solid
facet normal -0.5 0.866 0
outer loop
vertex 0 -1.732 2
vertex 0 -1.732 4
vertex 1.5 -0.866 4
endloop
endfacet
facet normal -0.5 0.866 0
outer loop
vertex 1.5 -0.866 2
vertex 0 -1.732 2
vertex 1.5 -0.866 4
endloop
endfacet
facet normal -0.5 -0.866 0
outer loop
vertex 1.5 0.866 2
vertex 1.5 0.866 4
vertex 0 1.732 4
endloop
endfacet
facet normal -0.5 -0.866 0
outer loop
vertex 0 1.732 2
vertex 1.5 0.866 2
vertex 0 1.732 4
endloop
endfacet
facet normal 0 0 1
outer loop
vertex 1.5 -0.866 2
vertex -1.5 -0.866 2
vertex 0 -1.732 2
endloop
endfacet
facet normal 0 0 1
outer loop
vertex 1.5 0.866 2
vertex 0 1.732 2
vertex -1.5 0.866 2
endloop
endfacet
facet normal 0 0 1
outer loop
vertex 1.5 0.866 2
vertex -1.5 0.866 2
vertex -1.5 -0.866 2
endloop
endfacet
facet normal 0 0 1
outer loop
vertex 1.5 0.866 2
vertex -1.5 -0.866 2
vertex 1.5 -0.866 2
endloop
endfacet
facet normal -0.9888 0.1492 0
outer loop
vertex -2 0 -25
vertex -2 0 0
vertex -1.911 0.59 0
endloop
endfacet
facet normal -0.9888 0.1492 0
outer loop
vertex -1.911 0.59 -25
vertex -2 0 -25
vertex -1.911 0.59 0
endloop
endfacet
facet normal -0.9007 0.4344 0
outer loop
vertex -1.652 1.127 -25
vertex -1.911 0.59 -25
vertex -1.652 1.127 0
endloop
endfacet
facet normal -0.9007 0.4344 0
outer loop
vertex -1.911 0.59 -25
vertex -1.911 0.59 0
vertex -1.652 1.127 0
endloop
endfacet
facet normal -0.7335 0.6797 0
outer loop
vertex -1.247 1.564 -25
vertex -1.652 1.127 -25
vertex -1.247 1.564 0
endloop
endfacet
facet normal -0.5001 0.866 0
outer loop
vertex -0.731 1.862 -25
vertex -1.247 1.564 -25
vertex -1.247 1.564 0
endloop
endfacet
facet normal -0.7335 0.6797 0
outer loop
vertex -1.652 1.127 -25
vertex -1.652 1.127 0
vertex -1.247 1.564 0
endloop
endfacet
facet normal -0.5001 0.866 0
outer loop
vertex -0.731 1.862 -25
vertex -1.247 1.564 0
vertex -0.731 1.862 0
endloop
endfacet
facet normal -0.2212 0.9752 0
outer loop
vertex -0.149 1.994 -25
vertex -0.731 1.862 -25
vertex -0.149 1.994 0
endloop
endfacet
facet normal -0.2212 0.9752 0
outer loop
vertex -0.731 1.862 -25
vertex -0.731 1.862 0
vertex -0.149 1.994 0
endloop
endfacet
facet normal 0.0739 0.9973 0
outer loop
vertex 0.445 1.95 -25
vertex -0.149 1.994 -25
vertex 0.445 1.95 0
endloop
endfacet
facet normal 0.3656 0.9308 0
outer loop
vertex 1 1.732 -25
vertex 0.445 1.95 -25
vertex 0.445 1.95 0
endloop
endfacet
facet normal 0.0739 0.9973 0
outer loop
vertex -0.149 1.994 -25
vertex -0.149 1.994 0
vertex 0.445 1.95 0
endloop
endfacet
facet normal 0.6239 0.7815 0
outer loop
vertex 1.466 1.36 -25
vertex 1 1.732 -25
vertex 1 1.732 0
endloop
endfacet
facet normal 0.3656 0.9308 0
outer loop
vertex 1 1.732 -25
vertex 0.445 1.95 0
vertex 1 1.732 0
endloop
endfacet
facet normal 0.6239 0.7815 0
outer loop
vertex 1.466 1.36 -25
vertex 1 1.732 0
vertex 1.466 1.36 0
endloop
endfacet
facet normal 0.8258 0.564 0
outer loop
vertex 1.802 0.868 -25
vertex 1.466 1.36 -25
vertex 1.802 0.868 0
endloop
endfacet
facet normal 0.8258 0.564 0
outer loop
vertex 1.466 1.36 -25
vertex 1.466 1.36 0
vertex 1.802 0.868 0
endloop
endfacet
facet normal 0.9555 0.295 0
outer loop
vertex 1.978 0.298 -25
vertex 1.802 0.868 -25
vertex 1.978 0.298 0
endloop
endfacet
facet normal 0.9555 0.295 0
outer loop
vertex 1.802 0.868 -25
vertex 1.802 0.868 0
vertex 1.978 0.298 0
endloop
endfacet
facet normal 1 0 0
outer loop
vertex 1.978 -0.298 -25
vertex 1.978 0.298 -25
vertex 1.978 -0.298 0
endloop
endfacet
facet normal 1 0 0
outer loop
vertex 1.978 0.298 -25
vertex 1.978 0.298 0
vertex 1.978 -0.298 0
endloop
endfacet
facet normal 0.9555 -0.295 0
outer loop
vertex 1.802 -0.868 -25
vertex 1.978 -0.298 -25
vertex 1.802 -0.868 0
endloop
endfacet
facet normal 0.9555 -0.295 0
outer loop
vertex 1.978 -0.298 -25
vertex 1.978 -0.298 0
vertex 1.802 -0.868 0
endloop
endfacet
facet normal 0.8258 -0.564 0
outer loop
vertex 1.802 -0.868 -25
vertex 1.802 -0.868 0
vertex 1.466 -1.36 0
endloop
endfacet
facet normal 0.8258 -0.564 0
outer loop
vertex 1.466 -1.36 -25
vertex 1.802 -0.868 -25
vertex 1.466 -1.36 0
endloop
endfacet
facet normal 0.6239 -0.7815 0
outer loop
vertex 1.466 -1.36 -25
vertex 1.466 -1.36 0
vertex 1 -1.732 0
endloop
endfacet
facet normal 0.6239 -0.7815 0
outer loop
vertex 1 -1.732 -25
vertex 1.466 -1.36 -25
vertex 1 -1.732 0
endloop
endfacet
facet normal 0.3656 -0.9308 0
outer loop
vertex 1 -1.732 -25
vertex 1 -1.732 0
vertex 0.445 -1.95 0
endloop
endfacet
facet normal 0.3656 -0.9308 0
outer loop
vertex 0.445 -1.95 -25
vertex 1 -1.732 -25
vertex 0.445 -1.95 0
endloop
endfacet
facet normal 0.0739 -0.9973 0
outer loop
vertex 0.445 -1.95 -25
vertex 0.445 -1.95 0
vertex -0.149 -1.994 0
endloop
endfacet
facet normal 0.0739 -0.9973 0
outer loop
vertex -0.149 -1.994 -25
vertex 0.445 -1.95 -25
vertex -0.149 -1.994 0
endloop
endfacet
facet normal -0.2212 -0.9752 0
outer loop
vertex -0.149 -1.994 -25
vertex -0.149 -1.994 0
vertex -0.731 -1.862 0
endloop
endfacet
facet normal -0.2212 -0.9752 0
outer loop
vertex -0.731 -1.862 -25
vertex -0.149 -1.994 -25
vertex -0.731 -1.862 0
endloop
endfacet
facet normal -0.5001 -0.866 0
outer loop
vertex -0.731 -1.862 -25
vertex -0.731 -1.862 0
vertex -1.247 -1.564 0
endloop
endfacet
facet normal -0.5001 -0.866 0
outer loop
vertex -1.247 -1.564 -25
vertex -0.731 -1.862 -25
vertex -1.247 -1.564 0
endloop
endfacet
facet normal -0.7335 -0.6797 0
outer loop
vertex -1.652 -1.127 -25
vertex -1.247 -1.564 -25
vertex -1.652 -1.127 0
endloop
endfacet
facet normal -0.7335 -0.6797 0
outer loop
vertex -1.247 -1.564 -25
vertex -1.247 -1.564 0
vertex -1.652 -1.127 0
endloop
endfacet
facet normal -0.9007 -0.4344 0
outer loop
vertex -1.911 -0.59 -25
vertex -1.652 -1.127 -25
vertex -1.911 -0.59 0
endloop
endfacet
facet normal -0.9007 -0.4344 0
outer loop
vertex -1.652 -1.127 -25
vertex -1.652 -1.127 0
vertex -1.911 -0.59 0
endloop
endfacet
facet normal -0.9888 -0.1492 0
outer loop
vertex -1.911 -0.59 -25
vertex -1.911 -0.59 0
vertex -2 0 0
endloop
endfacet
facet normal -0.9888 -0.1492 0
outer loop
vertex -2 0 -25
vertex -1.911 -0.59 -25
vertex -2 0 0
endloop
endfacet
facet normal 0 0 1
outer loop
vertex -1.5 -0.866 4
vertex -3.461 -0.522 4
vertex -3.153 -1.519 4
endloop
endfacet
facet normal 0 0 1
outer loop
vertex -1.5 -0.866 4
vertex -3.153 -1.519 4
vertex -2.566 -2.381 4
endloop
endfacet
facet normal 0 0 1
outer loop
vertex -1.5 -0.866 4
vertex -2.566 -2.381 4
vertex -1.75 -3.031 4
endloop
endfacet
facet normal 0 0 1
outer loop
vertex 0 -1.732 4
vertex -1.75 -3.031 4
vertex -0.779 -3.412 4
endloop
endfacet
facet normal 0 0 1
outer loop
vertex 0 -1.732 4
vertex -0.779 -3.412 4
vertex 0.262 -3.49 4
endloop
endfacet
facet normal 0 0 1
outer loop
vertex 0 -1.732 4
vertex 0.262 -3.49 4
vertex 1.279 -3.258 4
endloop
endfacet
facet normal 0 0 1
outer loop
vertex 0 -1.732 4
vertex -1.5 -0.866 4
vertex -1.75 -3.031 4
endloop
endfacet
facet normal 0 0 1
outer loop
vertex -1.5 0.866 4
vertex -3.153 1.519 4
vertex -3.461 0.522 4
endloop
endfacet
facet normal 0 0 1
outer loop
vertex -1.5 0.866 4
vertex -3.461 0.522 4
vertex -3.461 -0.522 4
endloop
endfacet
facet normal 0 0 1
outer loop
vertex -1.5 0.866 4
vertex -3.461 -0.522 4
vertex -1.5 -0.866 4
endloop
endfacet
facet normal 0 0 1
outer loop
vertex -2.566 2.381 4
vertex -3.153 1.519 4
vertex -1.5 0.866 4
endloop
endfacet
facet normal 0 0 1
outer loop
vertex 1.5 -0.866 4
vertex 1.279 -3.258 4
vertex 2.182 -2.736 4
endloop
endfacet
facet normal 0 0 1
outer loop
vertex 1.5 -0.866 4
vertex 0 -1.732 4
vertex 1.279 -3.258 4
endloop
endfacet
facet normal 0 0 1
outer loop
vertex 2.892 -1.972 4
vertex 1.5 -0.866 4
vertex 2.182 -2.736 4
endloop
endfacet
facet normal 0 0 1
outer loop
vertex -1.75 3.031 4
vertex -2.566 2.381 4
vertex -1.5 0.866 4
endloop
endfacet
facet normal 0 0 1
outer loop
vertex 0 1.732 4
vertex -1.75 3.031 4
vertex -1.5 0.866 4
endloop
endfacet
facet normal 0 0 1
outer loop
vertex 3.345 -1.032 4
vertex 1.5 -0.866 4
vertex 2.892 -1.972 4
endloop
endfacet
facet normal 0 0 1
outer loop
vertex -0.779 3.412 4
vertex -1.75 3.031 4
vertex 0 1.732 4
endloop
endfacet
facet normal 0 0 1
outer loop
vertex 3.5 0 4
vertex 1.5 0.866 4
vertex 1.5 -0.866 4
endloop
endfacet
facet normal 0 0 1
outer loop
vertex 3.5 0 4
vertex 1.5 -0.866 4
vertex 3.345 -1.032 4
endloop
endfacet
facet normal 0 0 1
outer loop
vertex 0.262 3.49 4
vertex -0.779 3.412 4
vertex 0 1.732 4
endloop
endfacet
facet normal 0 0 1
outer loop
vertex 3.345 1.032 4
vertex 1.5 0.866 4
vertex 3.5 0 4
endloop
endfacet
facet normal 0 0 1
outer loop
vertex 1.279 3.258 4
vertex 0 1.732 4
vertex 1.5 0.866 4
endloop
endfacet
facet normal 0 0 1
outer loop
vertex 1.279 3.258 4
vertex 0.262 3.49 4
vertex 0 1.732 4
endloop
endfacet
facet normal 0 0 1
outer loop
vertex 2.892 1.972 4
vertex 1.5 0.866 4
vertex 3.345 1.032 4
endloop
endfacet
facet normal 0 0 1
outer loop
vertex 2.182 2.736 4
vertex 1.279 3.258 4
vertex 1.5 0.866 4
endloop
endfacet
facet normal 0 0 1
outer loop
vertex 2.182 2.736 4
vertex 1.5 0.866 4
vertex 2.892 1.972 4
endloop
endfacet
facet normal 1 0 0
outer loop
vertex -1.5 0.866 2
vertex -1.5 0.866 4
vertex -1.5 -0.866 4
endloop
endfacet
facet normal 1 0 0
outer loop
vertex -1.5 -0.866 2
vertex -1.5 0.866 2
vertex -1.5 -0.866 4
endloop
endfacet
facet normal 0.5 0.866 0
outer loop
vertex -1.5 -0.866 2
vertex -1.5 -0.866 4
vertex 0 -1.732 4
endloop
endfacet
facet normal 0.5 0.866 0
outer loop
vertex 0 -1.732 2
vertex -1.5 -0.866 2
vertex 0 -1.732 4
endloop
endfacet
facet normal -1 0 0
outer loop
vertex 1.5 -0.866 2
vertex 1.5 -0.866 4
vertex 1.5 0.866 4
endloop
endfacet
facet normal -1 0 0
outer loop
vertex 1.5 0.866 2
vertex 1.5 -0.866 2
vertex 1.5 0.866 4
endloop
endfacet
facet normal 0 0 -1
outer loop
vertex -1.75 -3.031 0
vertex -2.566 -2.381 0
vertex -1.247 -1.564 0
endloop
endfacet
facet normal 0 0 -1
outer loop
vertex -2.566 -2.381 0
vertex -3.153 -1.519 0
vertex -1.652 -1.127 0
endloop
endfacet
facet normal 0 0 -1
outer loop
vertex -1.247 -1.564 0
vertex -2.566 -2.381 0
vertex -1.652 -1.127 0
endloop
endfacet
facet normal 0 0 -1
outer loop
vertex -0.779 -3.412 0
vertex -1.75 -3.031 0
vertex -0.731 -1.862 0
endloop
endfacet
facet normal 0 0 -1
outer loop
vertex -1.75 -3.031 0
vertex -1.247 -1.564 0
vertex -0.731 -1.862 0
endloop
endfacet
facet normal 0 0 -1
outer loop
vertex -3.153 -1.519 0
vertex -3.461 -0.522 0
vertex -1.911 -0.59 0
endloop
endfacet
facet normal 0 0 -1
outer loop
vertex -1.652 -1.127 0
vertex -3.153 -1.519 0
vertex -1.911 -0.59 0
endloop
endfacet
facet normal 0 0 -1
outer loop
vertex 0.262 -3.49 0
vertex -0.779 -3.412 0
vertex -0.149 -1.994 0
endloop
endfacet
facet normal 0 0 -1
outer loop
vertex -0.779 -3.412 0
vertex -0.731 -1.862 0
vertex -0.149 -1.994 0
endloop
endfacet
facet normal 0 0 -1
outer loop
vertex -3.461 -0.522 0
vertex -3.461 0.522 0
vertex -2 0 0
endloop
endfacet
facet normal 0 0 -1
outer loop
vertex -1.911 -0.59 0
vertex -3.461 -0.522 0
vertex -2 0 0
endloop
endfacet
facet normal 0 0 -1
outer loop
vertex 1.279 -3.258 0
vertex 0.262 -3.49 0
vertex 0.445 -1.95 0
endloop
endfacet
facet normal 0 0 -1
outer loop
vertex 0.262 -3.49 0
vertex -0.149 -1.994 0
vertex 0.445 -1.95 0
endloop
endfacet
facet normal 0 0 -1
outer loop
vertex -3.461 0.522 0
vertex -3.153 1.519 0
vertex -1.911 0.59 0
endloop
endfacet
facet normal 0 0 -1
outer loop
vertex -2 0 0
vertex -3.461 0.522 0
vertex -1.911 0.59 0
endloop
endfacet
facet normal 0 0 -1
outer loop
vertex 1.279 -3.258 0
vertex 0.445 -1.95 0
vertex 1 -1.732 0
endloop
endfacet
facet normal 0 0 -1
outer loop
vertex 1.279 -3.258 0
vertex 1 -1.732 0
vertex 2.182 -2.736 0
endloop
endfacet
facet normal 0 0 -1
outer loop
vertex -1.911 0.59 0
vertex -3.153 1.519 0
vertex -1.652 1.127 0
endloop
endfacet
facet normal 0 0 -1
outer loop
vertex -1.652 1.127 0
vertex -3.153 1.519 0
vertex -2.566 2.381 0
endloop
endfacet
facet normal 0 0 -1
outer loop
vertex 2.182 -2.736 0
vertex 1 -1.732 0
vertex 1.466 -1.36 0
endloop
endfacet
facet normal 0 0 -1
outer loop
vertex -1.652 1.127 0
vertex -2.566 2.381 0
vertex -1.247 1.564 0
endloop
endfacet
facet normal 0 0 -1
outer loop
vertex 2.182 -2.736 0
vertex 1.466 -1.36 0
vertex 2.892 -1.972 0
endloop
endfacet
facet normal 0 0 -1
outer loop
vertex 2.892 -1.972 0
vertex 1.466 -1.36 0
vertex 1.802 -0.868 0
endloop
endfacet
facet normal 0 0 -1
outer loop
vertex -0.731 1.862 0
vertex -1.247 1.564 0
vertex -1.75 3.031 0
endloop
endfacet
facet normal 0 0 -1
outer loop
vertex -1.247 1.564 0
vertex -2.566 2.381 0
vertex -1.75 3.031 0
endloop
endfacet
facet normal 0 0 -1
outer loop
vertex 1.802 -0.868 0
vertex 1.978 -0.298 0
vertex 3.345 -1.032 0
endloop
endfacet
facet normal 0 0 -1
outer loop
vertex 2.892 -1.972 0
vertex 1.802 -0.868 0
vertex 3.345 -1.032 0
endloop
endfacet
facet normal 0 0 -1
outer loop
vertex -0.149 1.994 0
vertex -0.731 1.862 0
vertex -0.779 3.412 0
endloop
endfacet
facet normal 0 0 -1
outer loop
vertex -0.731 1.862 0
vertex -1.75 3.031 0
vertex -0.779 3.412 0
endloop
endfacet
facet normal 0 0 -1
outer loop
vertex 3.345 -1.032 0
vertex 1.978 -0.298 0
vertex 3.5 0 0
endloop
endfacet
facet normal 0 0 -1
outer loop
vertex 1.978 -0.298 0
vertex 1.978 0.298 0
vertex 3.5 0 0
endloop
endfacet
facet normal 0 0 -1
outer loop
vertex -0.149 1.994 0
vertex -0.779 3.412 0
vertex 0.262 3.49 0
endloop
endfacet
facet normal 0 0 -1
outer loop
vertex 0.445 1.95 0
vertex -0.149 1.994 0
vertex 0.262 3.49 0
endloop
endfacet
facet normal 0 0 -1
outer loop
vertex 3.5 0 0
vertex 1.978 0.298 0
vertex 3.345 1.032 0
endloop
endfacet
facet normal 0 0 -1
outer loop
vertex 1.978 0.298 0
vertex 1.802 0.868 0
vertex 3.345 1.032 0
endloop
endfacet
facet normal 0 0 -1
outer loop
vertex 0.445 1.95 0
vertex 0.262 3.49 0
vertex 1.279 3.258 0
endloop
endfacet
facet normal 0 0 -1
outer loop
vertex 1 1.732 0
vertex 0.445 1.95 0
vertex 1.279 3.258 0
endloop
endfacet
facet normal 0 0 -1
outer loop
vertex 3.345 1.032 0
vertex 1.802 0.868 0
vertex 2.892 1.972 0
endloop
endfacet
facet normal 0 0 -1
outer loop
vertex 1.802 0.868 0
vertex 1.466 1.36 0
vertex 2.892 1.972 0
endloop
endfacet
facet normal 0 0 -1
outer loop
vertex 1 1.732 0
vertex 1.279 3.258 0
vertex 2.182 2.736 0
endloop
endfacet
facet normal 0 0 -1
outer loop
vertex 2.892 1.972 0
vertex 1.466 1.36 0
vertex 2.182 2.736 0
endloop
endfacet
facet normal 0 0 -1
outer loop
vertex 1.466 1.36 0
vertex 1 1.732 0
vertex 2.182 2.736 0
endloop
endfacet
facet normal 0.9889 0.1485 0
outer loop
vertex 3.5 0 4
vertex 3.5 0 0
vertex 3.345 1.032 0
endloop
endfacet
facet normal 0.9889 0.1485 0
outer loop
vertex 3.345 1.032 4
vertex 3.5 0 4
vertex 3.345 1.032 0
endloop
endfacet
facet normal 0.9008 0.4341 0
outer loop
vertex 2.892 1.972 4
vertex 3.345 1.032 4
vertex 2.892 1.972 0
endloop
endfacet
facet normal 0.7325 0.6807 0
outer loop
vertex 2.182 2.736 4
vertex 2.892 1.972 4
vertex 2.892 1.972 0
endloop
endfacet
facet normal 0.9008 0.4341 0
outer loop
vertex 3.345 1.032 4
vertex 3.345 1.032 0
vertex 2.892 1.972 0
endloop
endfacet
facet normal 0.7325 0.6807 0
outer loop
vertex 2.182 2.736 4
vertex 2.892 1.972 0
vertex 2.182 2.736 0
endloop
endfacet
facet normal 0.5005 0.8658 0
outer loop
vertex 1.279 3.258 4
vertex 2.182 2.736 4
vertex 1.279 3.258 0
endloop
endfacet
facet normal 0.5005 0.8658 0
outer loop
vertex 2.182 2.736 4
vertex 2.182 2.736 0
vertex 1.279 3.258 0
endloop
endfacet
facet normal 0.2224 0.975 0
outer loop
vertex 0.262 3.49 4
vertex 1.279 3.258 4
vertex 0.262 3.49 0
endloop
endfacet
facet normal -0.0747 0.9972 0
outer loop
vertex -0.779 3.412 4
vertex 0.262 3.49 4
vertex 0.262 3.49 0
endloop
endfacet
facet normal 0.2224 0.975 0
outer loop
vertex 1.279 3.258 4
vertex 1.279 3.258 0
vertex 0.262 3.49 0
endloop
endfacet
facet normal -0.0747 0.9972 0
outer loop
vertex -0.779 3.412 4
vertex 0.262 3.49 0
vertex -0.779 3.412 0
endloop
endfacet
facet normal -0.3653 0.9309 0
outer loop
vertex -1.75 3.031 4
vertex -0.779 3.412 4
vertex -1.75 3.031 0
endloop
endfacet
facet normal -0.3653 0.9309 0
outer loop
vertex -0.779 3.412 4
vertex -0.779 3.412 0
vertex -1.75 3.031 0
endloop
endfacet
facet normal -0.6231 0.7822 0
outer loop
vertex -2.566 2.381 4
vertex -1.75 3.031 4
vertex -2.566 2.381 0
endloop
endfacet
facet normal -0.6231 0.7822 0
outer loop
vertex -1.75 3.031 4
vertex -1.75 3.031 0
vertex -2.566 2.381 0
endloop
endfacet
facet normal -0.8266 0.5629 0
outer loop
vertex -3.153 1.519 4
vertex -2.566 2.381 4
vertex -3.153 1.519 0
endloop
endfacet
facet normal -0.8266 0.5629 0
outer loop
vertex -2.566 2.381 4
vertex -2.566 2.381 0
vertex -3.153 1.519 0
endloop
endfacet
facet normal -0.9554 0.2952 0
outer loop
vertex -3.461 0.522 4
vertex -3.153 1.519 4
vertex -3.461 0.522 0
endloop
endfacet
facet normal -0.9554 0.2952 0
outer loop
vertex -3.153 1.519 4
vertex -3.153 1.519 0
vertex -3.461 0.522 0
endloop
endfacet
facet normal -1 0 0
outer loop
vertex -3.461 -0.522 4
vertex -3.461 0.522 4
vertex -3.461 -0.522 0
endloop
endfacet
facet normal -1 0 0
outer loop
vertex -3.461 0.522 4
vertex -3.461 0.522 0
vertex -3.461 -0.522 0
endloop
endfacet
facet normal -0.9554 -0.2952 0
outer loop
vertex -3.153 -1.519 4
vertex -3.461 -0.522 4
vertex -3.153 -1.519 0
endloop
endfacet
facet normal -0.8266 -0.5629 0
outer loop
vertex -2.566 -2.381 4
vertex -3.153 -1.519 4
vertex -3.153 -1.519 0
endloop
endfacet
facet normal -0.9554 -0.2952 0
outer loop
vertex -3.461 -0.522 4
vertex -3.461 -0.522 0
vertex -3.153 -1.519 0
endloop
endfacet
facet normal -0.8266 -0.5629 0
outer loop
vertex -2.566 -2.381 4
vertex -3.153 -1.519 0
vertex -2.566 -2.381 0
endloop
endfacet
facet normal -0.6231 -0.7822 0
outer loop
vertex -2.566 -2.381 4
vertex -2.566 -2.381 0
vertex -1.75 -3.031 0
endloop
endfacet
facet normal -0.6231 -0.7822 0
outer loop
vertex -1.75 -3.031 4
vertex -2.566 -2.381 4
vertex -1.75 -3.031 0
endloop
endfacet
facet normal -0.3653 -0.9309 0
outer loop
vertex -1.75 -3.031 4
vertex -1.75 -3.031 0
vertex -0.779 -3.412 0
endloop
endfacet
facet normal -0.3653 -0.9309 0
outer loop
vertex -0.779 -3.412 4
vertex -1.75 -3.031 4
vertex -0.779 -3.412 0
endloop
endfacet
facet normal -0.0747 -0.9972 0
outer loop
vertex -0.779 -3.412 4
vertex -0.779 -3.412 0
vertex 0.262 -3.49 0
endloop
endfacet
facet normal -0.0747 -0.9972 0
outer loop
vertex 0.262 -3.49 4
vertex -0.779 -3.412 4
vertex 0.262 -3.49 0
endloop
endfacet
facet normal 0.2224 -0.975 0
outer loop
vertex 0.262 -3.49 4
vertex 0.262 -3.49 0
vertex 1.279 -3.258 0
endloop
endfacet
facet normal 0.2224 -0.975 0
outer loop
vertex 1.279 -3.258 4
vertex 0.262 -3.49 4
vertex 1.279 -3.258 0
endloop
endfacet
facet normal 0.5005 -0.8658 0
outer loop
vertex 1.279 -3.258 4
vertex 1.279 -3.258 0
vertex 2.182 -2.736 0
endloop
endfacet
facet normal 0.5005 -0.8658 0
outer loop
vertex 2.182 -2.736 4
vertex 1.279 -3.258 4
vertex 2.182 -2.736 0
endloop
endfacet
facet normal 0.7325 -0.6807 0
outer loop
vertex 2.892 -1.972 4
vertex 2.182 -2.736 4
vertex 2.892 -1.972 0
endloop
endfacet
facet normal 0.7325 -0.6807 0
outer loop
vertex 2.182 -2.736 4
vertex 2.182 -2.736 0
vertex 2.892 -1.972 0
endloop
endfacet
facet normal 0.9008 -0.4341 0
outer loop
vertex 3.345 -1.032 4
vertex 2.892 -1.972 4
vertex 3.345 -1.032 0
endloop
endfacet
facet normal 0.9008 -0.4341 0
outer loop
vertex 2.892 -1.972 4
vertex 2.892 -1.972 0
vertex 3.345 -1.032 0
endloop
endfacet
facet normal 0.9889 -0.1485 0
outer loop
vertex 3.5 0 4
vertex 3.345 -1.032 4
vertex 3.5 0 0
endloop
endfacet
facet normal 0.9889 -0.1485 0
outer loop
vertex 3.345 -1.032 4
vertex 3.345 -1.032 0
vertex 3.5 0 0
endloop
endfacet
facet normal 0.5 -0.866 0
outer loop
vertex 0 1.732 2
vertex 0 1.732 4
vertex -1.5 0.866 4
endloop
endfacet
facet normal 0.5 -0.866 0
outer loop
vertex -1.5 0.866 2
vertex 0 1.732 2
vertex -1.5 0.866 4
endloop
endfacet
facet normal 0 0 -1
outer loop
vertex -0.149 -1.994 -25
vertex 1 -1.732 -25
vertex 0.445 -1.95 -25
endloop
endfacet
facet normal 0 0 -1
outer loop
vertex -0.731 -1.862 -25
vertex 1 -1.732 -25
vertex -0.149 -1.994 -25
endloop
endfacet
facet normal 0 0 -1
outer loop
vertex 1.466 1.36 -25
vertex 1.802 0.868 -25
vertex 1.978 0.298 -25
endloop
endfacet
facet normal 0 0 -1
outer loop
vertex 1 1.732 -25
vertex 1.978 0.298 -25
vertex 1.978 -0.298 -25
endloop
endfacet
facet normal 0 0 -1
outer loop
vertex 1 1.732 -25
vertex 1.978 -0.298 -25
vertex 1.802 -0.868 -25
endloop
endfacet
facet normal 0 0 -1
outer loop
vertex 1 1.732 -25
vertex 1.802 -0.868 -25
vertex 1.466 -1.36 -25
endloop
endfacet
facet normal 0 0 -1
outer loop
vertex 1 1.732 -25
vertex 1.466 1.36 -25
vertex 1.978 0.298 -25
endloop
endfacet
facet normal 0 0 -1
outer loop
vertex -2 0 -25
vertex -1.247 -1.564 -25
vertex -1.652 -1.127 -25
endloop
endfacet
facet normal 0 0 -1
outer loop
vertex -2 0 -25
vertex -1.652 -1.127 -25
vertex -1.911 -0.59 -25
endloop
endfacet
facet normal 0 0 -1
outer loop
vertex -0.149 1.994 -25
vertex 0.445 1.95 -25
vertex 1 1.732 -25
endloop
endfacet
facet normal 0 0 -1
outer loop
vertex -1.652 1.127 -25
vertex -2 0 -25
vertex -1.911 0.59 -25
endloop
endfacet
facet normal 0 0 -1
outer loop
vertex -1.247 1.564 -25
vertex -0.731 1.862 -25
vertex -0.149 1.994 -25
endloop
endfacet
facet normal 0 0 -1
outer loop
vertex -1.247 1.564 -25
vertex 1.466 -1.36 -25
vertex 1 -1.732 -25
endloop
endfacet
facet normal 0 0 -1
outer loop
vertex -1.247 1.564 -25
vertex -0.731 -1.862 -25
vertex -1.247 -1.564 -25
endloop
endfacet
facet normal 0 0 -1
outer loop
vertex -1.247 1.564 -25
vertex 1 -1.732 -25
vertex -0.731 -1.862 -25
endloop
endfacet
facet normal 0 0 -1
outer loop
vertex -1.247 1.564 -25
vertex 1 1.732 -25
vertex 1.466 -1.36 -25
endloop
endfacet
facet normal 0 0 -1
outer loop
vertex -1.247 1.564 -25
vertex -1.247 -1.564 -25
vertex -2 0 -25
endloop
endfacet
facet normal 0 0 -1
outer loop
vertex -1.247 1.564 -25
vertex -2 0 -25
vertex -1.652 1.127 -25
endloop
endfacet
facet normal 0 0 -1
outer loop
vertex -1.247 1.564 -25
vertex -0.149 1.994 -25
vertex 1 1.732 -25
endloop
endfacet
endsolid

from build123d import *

# Parameters (mm, degrees)
SKETCH1_R           = 3.5
BOSS_EXTRUDE1_DEPTH = 4
CUT_EXTRUDE1_DEPTH  = 2
SKETCH3_R           = 2
BOSS_EXTRUDE2_DEPTH = 25


with BuildPart() as part:
    # Sketch1 → Boss-Extrude1 (new body)
    with BuildSketch(Plane.XY):
        Circle(SKETCH1_R)
    extrude(amount=BOSS_EXTRUDE1_DEPTH)

    # Sketch2 → Cut-Extrude1 (cut)
    with BuildSketch(Plane.XY.offset(4)):
        Polygon((0, -1.732050808), (1.5, -0.866025404), (1.5, 0.866025404), (0, 1.732050808), (-1.5, 0.866025404), (-1.5, -0.866025404), align=None)
    extrude(amount=-CUT_EXTRUDE1_DEPTH, mode=Mode.SUBTRACT)

    # Sketch3 → Boss-Extrude2 (add)
    with BuildSketch(Plane(origin=(0, 0, 0), x_dir=(-1, 0, 0), z_dir=(0, 0, -1))):
        Circle(SKETCH3_R)
    extrude(amount=BOSS_EXTRUDE2_DEPTH)


solid = part.part
